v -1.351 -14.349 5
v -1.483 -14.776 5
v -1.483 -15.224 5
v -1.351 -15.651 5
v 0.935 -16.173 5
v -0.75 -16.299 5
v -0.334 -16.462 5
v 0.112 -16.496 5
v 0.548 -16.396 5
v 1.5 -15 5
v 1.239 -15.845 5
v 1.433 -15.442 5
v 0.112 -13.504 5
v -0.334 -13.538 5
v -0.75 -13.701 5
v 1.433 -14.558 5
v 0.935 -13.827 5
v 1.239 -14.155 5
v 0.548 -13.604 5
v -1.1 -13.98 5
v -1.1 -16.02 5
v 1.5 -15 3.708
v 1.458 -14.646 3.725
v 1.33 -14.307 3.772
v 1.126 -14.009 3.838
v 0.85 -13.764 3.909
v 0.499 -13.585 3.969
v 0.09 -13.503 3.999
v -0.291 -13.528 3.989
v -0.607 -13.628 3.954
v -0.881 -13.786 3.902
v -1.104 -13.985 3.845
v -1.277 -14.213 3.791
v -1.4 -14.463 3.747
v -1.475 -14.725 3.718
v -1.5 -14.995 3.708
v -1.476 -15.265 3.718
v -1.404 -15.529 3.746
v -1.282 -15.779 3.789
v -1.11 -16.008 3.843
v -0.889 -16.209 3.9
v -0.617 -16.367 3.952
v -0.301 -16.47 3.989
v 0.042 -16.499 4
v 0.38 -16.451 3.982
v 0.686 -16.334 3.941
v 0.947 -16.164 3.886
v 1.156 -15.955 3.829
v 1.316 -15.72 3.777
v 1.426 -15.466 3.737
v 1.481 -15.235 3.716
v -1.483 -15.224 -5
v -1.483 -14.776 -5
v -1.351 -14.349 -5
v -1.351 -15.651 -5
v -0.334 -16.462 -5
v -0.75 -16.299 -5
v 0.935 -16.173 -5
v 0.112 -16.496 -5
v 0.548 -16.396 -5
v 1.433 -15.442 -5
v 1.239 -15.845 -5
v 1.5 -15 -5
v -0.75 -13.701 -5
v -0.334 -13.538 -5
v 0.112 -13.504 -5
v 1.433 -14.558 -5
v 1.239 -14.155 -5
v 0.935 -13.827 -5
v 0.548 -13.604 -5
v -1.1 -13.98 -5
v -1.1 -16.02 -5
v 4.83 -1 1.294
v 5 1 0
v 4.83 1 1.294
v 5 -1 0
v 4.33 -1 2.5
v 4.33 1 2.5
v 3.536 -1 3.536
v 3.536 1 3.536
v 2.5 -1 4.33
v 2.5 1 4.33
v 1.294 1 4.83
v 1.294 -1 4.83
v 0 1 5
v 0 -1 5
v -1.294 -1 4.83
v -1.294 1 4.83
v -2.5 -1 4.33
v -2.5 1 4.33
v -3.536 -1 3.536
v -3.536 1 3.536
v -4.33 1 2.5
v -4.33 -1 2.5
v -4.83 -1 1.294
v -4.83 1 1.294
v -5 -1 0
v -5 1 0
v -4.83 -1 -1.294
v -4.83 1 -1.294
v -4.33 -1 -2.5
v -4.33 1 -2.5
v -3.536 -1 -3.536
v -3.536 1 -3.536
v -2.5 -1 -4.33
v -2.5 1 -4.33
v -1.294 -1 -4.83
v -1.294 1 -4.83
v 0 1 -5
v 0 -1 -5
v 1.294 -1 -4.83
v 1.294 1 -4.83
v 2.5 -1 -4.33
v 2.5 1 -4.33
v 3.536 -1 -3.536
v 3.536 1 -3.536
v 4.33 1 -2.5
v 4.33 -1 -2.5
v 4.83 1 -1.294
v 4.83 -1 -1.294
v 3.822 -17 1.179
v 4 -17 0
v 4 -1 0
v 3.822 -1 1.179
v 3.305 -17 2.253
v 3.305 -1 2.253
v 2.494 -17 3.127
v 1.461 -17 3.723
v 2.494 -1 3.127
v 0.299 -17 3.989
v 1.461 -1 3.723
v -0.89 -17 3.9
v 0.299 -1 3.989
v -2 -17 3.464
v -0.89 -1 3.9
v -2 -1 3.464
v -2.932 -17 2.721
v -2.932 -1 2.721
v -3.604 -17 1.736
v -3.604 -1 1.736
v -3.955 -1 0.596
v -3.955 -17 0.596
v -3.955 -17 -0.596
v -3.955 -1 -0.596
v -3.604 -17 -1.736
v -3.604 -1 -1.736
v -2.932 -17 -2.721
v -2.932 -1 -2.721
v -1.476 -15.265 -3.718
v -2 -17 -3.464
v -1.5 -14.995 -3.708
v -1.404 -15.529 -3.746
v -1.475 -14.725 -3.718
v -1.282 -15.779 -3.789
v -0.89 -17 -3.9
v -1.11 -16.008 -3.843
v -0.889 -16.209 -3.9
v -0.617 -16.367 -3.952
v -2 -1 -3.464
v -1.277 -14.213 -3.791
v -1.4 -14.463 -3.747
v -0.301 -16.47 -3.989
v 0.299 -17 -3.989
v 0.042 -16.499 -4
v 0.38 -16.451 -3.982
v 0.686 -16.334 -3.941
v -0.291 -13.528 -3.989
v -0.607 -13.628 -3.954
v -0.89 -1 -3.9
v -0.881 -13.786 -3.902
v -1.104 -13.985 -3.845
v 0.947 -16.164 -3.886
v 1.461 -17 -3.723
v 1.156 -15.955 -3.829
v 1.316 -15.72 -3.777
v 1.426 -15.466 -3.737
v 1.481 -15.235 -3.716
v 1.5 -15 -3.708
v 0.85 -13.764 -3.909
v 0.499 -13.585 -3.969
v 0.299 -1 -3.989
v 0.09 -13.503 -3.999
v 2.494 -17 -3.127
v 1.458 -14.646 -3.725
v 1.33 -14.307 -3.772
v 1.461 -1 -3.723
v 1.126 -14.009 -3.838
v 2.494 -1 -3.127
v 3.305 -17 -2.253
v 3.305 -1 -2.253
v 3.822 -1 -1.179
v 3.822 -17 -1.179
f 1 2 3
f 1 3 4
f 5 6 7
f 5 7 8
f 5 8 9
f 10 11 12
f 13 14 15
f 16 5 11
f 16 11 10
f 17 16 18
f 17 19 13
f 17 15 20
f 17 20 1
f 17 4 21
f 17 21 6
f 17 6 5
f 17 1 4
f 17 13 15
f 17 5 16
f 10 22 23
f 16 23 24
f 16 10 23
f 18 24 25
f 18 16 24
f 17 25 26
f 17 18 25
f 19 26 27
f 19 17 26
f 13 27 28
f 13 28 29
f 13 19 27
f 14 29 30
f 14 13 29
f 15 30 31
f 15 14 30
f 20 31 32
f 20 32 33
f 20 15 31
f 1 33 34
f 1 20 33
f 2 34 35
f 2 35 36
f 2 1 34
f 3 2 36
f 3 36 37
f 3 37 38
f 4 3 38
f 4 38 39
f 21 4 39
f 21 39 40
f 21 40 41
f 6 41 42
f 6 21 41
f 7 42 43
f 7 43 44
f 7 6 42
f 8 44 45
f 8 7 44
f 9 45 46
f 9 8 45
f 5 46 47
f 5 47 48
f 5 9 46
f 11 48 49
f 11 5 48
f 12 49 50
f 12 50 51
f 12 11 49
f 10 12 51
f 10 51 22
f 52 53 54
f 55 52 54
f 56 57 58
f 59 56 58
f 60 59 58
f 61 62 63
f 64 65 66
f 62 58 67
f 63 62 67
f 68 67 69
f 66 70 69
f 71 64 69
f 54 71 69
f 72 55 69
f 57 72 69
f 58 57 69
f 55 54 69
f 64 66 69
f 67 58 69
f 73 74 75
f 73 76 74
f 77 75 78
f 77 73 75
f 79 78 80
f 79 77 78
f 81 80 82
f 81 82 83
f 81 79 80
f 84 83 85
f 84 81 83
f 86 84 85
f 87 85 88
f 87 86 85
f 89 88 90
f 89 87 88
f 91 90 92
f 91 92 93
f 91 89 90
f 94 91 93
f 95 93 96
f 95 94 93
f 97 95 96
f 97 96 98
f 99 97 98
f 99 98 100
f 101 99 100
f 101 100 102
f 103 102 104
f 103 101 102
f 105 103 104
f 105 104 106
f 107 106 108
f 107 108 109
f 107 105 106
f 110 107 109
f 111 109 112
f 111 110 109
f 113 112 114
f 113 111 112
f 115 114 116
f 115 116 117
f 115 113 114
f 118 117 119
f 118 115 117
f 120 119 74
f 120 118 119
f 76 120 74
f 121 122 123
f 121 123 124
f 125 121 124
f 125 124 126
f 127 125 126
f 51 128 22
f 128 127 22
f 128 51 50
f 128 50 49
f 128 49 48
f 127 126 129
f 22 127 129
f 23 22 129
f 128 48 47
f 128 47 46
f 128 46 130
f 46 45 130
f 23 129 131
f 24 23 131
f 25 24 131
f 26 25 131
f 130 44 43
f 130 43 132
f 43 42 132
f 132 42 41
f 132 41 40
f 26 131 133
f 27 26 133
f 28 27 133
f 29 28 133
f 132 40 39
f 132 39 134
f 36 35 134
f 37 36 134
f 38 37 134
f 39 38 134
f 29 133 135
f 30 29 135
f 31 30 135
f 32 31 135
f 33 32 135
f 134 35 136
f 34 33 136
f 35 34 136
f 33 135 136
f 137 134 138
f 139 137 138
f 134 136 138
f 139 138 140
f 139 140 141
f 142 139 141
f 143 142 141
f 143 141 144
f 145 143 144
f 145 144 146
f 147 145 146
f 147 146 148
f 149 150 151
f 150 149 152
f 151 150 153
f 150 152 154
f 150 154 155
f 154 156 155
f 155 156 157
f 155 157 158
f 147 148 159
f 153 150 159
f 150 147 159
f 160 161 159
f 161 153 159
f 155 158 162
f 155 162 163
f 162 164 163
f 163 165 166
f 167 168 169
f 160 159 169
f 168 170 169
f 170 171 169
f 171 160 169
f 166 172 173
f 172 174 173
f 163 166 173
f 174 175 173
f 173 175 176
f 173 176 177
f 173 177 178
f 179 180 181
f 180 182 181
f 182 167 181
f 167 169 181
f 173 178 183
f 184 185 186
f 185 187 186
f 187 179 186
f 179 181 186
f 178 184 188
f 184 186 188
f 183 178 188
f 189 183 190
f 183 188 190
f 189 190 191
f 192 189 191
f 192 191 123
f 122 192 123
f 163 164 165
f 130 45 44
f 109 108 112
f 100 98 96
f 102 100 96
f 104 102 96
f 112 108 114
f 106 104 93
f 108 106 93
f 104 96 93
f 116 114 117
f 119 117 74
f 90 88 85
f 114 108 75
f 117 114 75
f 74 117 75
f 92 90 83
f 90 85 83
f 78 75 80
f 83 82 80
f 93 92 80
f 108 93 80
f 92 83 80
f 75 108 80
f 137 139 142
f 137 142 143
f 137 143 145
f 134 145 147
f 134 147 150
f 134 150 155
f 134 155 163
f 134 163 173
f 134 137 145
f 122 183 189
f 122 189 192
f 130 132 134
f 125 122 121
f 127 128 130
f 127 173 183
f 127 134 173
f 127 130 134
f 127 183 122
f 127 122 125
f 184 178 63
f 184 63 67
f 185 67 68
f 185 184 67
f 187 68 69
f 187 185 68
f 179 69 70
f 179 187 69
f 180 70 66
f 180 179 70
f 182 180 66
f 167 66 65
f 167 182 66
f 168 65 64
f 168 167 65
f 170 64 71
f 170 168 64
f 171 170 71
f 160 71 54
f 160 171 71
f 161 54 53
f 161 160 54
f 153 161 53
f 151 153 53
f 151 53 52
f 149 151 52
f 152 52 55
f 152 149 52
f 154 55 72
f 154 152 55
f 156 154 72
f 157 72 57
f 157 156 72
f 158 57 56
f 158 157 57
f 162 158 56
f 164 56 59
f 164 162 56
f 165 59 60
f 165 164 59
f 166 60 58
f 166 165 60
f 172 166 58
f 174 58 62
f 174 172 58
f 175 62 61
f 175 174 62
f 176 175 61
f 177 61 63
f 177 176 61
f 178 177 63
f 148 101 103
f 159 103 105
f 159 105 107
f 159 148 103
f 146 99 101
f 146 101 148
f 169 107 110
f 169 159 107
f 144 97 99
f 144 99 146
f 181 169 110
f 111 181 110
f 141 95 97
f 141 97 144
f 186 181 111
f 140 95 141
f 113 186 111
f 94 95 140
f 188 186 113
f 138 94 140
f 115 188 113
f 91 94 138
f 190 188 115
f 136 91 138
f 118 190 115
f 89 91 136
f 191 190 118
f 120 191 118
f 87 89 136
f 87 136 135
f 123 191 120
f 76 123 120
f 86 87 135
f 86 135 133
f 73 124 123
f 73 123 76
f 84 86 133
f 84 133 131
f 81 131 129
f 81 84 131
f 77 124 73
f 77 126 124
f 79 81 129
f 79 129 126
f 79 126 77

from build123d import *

# Parameters (mm, degrees)
F0_R     = 5
F1_DEPTH = 1
F2_R     = 4
F3_DEPTH = 16
F4_R     = 1.5
F5_DEPTH = 5


with BuildPart() as f1:
    # F0 (on Front) → F1 (new body, symmetric)
    with BuildSketch(Plane.XZ):
        Circle(F0_R)
    extrude(amount=F1_DEPTH, both=True)

    # F2 (on face) → F3 (join)
    with BuildSketch(Plane.XZ.offset(1)):
        Circle(F2_R)
    extrude(amount=F3_DEPTH)

    # F4 (on Top) → F5 (join, symmetric)
    with BuildSketch(Plane.XY):
        with Locations((0, -15)):
            Circle(F4_R)
    extrude(amount=F5_DEPTH, both=True)


solid = f1.part
